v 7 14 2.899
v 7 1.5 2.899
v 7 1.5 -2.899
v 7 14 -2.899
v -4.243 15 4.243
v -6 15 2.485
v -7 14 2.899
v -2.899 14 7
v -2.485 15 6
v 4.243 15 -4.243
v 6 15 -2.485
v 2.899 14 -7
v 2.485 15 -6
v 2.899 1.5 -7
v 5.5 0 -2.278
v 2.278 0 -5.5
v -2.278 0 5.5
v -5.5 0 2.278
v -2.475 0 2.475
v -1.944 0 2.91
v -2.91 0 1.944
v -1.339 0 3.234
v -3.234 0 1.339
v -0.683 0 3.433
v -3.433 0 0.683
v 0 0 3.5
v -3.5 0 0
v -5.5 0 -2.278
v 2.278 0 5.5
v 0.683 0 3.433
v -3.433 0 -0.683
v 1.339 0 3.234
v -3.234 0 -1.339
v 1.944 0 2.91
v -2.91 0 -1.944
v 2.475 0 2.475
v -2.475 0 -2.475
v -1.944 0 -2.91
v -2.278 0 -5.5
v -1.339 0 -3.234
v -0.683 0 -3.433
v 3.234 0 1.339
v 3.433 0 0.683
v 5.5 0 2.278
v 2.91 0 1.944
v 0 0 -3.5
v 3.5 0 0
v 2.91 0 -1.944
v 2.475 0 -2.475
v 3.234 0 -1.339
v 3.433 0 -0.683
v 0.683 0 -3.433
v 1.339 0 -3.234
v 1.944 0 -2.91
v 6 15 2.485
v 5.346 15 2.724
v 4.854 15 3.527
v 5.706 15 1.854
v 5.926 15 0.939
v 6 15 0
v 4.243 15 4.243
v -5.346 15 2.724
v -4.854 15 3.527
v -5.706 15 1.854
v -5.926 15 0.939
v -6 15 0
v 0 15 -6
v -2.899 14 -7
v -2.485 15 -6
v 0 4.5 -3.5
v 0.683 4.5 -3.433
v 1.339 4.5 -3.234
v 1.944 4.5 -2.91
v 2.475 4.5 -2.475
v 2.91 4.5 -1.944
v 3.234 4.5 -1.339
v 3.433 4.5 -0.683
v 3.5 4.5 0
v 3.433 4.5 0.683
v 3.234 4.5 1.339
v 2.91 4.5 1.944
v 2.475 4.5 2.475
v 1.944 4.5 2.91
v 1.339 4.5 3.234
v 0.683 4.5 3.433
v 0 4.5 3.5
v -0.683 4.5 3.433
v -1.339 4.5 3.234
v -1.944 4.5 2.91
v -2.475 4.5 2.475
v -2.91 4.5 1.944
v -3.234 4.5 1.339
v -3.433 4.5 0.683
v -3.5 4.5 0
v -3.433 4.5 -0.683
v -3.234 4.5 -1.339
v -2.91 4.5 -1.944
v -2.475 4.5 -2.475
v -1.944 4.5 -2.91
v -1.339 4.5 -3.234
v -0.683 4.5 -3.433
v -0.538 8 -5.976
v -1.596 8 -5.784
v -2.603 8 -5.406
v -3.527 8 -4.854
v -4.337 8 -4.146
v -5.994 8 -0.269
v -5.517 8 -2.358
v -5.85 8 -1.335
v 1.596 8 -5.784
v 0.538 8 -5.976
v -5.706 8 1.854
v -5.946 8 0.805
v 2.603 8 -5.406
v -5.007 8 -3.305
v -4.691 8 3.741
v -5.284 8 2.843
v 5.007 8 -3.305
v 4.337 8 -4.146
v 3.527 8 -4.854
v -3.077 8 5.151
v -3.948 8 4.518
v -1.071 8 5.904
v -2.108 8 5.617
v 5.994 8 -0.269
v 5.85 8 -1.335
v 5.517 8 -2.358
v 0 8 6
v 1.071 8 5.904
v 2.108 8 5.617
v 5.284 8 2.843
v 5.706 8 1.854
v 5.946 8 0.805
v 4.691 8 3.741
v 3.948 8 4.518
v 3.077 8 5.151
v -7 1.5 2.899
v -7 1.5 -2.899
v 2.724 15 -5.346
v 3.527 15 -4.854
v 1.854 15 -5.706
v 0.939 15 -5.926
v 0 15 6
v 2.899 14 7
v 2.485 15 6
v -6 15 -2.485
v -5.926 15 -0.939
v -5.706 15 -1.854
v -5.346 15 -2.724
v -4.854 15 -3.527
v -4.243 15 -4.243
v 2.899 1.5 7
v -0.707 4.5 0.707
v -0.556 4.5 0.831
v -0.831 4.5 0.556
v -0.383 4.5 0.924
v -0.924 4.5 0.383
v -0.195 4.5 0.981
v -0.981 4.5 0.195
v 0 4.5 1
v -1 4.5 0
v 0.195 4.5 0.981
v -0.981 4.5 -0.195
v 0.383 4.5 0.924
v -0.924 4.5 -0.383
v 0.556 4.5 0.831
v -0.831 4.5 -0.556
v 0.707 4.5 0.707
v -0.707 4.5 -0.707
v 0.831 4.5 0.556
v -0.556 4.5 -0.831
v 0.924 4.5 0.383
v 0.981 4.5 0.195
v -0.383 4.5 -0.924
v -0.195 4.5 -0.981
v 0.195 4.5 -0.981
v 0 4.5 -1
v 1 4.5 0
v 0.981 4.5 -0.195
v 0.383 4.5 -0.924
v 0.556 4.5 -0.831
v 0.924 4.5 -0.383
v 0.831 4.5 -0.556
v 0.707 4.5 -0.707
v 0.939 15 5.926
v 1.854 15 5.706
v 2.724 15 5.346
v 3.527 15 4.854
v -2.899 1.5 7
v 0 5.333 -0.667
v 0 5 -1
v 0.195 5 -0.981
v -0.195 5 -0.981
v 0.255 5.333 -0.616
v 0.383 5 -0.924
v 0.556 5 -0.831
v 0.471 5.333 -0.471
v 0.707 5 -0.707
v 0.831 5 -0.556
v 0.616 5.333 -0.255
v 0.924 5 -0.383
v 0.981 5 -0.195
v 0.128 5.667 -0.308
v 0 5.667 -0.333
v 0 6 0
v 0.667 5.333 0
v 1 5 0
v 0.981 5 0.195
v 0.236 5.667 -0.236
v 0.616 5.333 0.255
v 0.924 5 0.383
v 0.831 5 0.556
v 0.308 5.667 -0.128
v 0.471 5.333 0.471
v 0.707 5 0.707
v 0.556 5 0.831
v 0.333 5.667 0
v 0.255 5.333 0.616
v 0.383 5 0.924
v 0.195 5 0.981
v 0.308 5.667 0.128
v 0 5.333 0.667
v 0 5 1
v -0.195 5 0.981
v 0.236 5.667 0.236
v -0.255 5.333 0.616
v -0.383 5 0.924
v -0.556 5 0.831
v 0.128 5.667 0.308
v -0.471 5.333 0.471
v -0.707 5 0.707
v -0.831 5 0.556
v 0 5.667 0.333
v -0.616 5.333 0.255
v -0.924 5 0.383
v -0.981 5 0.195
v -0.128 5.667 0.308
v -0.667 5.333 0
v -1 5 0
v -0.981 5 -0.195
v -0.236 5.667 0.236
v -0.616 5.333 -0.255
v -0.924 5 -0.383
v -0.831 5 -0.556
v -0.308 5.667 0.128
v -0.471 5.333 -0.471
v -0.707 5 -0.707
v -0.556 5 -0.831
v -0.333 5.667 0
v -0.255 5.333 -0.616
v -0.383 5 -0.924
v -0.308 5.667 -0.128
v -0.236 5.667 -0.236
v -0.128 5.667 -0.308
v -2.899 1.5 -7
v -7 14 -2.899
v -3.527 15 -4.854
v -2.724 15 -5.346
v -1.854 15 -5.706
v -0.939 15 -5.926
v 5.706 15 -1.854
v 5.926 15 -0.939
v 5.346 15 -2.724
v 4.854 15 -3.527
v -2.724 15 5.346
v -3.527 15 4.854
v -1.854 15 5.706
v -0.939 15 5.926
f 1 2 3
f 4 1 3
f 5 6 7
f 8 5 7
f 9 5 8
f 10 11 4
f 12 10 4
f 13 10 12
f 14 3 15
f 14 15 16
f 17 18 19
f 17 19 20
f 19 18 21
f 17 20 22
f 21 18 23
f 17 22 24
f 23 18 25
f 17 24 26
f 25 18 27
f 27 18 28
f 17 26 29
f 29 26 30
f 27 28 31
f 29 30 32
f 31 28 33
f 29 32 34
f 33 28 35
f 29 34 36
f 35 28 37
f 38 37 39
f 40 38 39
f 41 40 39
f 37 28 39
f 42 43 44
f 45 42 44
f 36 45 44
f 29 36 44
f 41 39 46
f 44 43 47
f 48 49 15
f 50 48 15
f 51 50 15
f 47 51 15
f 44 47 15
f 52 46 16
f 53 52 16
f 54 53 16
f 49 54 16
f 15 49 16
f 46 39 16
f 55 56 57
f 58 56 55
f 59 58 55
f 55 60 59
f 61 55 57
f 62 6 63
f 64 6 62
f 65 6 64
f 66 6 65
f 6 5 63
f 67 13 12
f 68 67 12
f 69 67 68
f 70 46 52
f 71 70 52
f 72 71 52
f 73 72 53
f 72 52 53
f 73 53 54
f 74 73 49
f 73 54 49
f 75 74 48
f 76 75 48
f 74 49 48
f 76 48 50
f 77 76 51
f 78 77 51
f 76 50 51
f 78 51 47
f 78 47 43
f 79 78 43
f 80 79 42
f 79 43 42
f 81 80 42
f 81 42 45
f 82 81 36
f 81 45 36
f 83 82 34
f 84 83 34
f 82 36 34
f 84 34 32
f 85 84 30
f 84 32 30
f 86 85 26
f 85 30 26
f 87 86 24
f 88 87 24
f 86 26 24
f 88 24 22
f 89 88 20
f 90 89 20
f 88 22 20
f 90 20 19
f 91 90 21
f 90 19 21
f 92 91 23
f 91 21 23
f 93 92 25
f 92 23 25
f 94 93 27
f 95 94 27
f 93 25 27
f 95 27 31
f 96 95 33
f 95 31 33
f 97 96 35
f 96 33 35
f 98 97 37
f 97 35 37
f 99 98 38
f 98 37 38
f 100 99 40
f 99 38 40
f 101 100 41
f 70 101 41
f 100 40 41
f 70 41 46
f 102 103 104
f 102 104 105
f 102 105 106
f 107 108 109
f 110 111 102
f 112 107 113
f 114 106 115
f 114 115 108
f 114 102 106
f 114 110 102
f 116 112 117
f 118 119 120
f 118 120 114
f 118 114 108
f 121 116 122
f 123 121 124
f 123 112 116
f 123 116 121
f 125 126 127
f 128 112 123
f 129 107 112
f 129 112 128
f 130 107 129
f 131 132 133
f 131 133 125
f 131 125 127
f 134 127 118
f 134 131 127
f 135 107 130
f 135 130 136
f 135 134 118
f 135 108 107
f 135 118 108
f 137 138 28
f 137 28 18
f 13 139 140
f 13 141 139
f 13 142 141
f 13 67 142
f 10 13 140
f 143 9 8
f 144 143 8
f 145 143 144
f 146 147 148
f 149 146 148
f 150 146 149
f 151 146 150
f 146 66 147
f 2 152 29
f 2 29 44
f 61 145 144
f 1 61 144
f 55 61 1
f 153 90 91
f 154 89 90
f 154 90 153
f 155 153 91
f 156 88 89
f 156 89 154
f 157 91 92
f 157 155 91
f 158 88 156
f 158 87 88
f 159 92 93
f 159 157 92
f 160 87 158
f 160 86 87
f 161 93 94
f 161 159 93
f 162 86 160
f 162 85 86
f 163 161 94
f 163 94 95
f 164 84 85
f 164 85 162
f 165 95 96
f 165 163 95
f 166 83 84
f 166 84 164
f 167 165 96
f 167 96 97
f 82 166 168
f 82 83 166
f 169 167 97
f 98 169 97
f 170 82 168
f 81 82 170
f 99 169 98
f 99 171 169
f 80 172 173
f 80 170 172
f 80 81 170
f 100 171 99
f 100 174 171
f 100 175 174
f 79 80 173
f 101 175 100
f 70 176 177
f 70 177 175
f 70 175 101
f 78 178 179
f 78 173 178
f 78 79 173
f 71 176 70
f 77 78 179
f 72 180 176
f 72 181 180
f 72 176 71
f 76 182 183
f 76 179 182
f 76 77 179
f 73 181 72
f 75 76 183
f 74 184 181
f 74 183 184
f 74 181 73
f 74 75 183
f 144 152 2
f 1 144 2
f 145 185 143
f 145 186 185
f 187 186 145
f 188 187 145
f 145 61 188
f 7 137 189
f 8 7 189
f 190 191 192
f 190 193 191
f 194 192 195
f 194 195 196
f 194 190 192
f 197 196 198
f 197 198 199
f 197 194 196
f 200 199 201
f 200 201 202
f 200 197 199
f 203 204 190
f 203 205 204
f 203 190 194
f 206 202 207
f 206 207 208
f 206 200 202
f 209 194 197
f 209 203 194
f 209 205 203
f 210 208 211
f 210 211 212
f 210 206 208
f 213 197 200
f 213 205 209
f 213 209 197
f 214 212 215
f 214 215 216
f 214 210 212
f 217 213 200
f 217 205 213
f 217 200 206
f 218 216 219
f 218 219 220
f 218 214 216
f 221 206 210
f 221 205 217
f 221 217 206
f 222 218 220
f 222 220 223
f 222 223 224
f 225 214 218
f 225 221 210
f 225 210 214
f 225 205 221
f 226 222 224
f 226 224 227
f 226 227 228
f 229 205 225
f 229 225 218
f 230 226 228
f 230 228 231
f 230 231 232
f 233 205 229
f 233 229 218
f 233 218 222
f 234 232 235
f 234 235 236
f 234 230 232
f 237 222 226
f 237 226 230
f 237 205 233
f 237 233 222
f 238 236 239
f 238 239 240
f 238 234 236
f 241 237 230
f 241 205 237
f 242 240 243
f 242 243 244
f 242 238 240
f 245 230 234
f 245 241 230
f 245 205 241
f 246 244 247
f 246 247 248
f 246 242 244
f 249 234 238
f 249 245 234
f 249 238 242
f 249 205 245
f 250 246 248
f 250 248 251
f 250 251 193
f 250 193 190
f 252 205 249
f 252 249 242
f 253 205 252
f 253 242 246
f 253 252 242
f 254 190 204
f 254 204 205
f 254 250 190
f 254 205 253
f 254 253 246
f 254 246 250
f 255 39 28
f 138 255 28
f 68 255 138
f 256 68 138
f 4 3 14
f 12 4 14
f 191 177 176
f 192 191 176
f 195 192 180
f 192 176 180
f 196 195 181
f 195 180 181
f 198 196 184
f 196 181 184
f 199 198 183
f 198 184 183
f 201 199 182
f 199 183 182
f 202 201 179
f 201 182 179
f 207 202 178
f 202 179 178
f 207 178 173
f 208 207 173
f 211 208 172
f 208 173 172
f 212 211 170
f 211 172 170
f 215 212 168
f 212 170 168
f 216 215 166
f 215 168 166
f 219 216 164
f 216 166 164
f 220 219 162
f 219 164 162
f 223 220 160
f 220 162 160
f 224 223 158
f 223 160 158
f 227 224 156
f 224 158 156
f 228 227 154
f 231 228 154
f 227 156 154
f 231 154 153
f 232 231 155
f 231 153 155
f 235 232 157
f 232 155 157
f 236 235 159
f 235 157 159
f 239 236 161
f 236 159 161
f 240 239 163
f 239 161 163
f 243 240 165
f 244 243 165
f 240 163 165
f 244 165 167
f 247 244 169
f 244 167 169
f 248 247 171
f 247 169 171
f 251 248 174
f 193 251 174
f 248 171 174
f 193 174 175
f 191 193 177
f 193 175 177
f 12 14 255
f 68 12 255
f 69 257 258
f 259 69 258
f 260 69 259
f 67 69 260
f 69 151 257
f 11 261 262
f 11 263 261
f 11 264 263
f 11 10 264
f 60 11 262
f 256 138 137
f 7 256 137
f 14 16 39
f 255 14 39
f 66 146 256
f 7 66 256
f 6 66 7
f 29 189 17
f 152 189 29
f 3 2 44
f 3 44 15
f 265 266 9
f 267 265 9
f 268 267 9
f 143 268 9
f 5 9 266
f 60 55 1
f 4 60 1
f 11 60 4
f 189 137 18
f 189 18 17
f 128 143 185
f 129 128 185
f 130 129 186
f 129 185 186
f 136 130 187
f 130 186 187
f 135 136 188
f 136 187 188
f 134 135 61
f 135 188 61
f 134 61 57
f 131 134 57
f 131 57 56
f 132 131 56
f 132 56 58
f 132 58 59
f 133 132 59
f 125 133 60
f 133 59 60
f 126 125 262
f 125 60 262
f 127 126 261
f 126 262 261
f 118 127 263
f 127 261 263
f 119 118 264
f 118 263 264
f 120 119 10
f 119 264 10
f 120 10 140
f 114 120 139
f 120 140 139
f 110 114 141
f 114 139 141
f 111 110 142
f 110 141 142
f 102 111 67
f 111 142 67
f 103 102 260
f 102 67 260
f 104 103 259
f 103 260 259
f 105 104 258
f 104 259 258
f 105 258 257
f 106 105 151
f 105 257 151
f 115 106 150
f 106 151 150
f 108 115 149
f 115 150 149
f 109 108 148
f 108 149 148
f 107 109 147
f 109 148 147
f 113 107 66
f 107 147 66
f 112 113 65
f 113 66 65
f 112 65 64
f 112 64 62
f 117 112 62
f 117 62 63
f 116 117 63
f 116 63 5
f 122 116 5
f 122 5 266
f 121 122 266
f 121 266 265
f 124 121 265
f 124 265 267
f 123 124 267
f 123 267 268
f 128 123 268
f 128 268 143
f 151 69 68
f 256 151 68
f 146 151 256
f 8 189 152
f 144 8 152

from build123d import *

# Parameters (mm, degrees)
EXTRUDE_1_DEPTH     = 15
CHAMFER_1_SIZE      = 1
CHAMFER_2_SIZE      = 1.5
SKETCH_2_R          = 6
CUT_EXTRUDE_1_DEPTH = 7
SKETCH_3_R          = 3.5
CUT_EXTRUDE_2_DEPTH = 4.5
SKETCH_4_R          = 1
CUT_EXTRUDE_3_DEPTH = 1.5
CHAMFER_5_SIZE      = 1


with BuildPart() as part:
    # Эскиз1 → Бобышка-Вытянуть1 (new body)
    with BuildSketch(Plane(origin=(0, 0, 0), x_dir=(1, 0, 0), z_dir=(0, 1, 0))):
        Polygon((-2.899494937, 7), (-7, 2.899494937), (-7, -2.899494937), (-2.899494937, -7), (2.899494937, -7), (7, -2.899494937), (7, 2.899494937), (2.899494937, 7), align=None)
    extrude(amount=EXTRUDE_1_DEPTH)

    # Фаска1
    chamfer_1_edges = [part.edges().sort_by_distance(p)[0] for p in [
        (-4.949747468, 15, -4.949747468),
        (-7, 15, 0),
        (-4.949747468, 15, 4.949747468),
        (0, 15, 7),
        (4.949747468, 15, 4.949747468),
        (7, 15, 0),
        (4.949747468, 15, -4.949747468),
        (0, 15, -7),
    ]]
    chamfer(chamfer_1_edges, length=CHAMFER_1_SIZE)

    # Фаска2
    chamfer_2_edges = [part.edges().sort_by_distance(p)[0] for p in [
        (-4.949747468, 0, 4.949747468),
        (-7, 0, 0),
        (-4.949747468, 0, -4.949747468),
        (0, 0, -7),
        (4.949747468, 0, -4.949747468),
        (7, 0, 0),
        (4.949747468, 0, 4.949747468),
        (0, 0, 7),
    ]]
    chamfer(chamfer_2_edges, length=CHAMFER_2_SIZE)

    # Эскиз2 → Вырез-Вытянуть1 (cut)
    with BuildSketch(Plane(origin=(0, 15, 0), x_dir=(1, 0, 0), z_dir=(0, 1, 0))):
        with Locations(Location((0, 0, 0), (0, 0, 270))):
            Circle(SKETCH_2_R)
    extrude(amount=-CUT_EXTRUDE_1_DEPTH, mode=Mode.SUBTRACT)

    # Эскиз3 → Вырез-Вытянуть2 (cut)
    with BuildSketch(Plane.XZ):
        with Locations(Location((0, 0, 0), (0, 0, 270))):
            Circle(SKETCH_3_R)
    extrude(amount=-CUT_EXTRUDE_2_DEPTH, mode=Mode.SUBTRACT)

    # Эскиз4 → Вырез-Вытянуть3 (cut)
    with BuildSketch(Plane.XZ.offset(-4.5)):
        with Locations(Location((0, 0, 0), (0, 0, 270))):
            Circle(SKETCH_4_R)
    extrude(amount=-CUT_EXTRUDE_3_DEPTH, mode=Mode.SUBTRACT)

    # Фаска5
    chamfer_5_edges = [part.edges().sort_by_distance(p)[0] for p in [
        (0, 6, 1),
    ]]
    chamfer(chamfer_5_edges, length=CHAMFER_5_SIZE)


solid = part.part
